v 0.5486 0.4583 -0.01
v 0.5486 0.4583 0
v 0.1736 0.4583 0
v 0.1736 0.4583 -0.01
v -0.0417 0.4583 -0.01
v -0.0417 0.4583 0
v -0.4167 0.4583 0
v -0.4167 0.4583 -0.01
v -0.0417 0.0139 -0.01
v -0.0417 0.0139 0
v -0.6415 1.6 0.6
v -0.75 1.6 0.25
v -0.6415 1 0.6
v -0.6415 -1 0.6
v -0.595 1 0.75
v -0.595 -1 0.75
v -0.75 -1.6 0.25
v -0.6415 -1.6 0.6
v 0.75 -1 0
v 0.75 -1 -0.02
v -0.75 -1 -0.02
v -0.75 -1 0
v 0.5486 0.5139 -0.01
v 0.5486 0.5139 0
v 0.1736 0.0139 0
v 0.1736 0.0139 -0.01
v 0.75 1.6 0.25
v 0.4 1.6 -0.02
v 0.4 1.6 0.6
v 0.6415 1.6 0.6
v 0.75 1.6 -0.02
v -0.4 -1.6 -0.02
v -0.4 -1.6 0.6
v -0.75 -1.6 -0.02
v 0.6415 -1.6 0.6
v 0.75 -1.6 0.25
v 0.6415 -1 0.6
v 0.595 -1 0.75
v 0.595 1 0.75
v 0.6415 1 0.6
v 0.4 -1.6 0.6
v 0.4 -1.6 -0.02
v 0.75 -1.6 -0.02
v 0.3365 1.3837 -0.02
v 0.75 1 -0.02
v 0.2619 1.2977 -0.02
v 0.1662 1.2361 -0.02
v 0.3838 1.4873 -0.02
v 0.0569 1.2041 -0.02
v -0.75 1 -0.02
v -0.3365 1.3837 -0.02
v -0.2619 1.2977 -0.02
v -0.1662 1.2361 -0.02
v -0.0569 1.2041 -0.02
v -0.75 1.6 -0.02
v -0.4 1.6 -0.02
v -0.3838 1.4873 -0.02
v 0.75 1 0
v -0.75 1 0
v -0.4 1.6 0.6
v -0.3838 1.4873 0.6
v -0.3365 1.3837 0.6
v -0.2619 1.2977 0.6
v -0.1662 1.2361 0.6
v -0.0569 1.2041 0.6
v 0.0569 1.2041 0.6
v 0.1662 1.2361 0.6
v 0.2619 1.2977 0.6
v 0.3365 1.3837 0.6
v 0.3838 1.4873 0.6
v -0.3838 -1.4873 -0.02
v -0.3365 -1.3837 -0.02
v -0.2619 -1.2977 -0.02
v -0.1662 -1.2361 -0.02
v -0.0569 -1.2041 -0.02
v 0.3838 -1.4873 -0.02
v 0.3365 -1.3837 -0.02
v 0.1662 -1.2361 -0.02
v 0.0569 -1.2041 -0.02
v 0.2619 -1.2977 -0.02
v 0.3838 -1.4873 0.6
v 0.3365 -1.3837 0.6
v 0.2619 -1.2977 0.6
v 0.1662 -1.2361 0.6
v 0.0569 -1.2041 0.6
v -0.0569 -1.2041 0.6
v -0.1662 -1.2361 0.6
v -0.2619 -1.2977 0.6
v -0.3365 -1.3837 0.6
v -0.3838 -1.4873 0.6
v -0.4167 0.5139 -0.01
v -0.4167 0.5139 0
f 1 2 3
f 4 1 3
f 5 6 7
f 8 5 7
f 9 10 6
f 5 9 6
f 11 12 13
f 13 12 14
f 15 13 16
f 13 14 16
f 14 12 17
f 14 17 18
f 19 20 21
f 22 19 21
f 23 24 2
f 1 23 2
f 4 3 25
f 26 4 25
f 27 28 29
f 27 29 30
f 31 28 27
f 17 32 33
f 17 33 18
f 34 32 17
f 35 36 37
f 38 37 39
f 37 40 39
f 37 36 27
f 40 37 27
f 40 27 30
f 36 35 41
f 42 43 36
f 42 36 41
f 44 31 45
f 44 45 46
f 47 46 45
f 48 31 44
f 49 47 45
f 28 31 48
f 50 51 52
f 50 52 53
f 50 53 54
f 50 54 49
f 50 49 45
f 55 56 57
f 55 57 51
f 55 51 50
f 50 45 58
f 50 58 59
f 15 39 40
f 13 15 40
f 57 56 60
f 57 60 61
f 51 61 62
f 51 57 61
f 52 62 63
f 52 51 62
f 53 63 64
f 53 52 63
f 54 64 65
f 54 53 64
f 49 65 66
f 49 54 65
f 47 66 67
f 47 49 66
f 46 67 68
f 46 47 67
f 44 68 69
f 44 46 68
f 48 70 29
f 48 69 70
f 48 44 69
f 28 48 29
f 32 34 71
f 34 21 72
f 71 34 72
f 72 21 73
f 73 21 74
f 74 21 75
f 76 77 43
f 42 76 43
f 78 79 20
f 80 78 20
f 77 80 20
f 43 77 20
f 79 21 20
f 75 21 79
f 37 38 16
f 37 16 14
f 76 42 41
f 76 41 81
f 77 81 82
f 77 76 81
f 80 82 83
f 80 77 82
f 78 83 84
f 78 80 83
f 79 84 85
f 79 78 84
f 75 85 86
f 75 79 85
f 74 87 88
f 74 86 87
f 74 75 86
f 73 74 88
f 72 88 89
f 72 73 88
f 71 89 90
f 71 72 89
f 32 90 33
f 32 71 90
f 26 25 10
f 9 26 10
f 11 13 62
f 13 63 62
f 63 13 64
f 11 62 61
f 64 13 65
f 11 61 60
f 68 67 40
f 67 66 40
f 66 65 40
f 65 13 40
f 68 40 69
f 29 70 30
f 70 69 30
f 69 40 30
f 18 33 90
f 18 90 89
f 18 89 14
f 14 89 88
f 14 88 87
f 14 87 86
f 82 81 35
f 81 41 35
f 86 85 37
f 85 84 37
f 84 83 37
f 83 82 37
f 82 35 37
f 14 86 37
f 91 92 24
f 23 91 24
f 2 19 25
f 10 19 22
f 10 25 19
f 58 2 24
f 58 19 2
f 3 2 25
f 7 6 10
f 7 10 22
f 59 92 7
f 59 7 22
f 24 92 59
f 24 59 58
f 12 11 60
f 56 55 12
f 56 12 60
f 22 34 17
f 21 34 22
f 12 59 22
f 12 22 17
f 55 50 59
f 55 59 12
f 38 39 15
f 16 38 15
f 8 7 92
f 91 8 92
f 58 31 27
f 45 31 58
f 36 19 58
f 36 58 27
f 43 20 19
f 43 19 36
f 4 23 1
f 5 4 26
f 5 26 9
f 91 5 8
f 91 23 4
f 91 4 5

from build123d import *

# Parameters (mm, degrees)
EXTRUDE_1_DEPTH     = 0.75
CUT_EXTRUDE_1_REACH = 4.318
SKETCH_2_W          = 0.15
SKETCH_2_H          = 0.667874604
WRAP_1_DEPTH        = 0.01
CUT_EXTRUDE_2_DEPTH = 5
EXTRUDE_START       = 0.02
EXTRUDE_2_DEPTH     = 0.02


# Read off the part's stored shape, not the designer's step: 包覆1
with BuildPart() as part:
    # 草图1 → 凸台-拉伸1 (new body)
    with BuildSketch(Plane.XY):
        with BuildLine():
            Line((-0.75, 1.6), (-0.4, 1.6))
            ThreePointArc((-0.4, 1.6), (0, 1.2), (0.4, 1.6))
            Line((0.4, 1.6), (0.75, 1.6))
            Line((0.75, 1.6), (0.75, -1.6))
            Line((0.75, -1.6), (0.4, -1.6))
            ThreePointArc((0.4, -1.6), (0, -1.2), (-0.4, -1.6))
            Line((-0.4, -1.6), (-0.75, -1.6))
            Line((-0.75, -1.6), (-0.75, 1.6))
        make_face()
    extrude(amount=EXTRUDE_1_DEPTH)

    # 草图2 → 切除-拉伸1 (cut, up to next)
    with BuildSketch(Plane(origin=(0.75, 0, 0), x_dir=(0, 0, -1), z_dir=(1, 0, 0)), mode=Mode.PRIVATE) as cut_extrude_1_sk1:
        with Locations((-0.675, 1.333937302)):
            Rectangle(SKETCH_2_W, SKETCH_2_H)
    cut_extrude_1_tool1 = extrude(cut_extrude_1_sk1.sketch, amount=-CUT_EXTRUDE_1_REACH, mode=Mode.PRIVATE) & part.part
    # 草图2 → 切除-拉伸1 (cut, up to next)
    with BuildSketch(Plane(origin=(0.75, 0, 0), x_dir=(0, 0, -1), z_dir=(1, 0, 0)), mode=Mode.PRIVATE) as cut_extrude_1_sk2:
        with Locations((-0.675, -1.333937302)):
            Rectangle(SKETCH_2_W, SKETCH_2_H)
    cut_extrude_1_tool2 = extrude(cut_extrude_1_sk2.sketch, amount=-CUT_EXTRUDE_1_REACH, mode=Mode.PRIVATE) & part.part
    add(cut_extrude_1_tool1.solids().sort_by_distance((0.75, 1.333937, 0.675))[0], mode=Mode.SUBTRACT)
    add(cut_extrude_1_tool2.solids().sort_by_distance((0.75, -1.333937, 0.675))[0], mode=Mode.SUBTRACT)

    # 包覆1 outline → 包覆1 (add)
    with BuildSketch(Plane(origin=(0, 0, 0), x_dir=(-1, 0, 0), z_dir=(0, 0, -1))):
        Polygon((0.041666667, 0.013888889), (0.041666667, 0.458333333), (0.416666667, 0.458333333), (0.416666667, 0.513888889), (-0.548611111, 0.513888889), (-0.548611111, 0.458333333), (-0.173611111, 0.458333333), (-0.173611111, 0.013888889), align=None)
    extrude(amount=WRAP_1_DEPTH)

    # 草图7 → 切除-拉伸2 (cut, symmetric)
    with BuildSketch(Plane(origin=(0, 0.625, 0), x_dir=(1, 0, 0), z_dir=(0, 1, 0))):
        Polygon((-0.75, -0.25), (-0.595016124, -0.75), (-0.75, -0.75), align=None)
        Polygon((0.595016124, -0.75), (0.75, -0.75), (0.75, -0.25), align=None)
    extrude(amount=CUT_EXTRUDE_2_DEPTH, both=True, mode=Mode.SUBTRACT)

    # 草图8 → 凸台-拉伸2 (add)
    with BuildSketch(Plane(origin=(0, 0, 0), x_dir=(-1, 0, 0), z_dir=(0, 0, -1)).offset(EXTRUDE_START)):
        with BuildLine():
            Line((-0.75, 1), (0.75, 1))
            Line((0.75, 1), (0.75, 1.6))
            Line((0.75, 1.6), (0.4, 1.6))
            ThreePointArc((0.4, 1.6), (0, 1.2), (-0.4, 1.6))
            Line((-0.4, 1.6), (-0.75, 1.6))
            Line((-0.75, 1.6), (-0.75, 1))
        make_face()
        with BuildLine():
            Line((-0.75, -1), (0.75, -1))
            Line((0.75, -1), (0.75, -1.6))
            Line((0.75, -1.6), (0.4, -1.6))
            ThreePointArc((0.4, -1.6), (0, -1.2), (-0.4, -1.6))
            Line((-0.4, -1.6), (-0.75, -1.6))
            Line((-0.75, -1.6), (-0.75, -1))
        make_face()
    extrude(amount=-EXTRUDE_2_DEPTH)


solid = part.part
